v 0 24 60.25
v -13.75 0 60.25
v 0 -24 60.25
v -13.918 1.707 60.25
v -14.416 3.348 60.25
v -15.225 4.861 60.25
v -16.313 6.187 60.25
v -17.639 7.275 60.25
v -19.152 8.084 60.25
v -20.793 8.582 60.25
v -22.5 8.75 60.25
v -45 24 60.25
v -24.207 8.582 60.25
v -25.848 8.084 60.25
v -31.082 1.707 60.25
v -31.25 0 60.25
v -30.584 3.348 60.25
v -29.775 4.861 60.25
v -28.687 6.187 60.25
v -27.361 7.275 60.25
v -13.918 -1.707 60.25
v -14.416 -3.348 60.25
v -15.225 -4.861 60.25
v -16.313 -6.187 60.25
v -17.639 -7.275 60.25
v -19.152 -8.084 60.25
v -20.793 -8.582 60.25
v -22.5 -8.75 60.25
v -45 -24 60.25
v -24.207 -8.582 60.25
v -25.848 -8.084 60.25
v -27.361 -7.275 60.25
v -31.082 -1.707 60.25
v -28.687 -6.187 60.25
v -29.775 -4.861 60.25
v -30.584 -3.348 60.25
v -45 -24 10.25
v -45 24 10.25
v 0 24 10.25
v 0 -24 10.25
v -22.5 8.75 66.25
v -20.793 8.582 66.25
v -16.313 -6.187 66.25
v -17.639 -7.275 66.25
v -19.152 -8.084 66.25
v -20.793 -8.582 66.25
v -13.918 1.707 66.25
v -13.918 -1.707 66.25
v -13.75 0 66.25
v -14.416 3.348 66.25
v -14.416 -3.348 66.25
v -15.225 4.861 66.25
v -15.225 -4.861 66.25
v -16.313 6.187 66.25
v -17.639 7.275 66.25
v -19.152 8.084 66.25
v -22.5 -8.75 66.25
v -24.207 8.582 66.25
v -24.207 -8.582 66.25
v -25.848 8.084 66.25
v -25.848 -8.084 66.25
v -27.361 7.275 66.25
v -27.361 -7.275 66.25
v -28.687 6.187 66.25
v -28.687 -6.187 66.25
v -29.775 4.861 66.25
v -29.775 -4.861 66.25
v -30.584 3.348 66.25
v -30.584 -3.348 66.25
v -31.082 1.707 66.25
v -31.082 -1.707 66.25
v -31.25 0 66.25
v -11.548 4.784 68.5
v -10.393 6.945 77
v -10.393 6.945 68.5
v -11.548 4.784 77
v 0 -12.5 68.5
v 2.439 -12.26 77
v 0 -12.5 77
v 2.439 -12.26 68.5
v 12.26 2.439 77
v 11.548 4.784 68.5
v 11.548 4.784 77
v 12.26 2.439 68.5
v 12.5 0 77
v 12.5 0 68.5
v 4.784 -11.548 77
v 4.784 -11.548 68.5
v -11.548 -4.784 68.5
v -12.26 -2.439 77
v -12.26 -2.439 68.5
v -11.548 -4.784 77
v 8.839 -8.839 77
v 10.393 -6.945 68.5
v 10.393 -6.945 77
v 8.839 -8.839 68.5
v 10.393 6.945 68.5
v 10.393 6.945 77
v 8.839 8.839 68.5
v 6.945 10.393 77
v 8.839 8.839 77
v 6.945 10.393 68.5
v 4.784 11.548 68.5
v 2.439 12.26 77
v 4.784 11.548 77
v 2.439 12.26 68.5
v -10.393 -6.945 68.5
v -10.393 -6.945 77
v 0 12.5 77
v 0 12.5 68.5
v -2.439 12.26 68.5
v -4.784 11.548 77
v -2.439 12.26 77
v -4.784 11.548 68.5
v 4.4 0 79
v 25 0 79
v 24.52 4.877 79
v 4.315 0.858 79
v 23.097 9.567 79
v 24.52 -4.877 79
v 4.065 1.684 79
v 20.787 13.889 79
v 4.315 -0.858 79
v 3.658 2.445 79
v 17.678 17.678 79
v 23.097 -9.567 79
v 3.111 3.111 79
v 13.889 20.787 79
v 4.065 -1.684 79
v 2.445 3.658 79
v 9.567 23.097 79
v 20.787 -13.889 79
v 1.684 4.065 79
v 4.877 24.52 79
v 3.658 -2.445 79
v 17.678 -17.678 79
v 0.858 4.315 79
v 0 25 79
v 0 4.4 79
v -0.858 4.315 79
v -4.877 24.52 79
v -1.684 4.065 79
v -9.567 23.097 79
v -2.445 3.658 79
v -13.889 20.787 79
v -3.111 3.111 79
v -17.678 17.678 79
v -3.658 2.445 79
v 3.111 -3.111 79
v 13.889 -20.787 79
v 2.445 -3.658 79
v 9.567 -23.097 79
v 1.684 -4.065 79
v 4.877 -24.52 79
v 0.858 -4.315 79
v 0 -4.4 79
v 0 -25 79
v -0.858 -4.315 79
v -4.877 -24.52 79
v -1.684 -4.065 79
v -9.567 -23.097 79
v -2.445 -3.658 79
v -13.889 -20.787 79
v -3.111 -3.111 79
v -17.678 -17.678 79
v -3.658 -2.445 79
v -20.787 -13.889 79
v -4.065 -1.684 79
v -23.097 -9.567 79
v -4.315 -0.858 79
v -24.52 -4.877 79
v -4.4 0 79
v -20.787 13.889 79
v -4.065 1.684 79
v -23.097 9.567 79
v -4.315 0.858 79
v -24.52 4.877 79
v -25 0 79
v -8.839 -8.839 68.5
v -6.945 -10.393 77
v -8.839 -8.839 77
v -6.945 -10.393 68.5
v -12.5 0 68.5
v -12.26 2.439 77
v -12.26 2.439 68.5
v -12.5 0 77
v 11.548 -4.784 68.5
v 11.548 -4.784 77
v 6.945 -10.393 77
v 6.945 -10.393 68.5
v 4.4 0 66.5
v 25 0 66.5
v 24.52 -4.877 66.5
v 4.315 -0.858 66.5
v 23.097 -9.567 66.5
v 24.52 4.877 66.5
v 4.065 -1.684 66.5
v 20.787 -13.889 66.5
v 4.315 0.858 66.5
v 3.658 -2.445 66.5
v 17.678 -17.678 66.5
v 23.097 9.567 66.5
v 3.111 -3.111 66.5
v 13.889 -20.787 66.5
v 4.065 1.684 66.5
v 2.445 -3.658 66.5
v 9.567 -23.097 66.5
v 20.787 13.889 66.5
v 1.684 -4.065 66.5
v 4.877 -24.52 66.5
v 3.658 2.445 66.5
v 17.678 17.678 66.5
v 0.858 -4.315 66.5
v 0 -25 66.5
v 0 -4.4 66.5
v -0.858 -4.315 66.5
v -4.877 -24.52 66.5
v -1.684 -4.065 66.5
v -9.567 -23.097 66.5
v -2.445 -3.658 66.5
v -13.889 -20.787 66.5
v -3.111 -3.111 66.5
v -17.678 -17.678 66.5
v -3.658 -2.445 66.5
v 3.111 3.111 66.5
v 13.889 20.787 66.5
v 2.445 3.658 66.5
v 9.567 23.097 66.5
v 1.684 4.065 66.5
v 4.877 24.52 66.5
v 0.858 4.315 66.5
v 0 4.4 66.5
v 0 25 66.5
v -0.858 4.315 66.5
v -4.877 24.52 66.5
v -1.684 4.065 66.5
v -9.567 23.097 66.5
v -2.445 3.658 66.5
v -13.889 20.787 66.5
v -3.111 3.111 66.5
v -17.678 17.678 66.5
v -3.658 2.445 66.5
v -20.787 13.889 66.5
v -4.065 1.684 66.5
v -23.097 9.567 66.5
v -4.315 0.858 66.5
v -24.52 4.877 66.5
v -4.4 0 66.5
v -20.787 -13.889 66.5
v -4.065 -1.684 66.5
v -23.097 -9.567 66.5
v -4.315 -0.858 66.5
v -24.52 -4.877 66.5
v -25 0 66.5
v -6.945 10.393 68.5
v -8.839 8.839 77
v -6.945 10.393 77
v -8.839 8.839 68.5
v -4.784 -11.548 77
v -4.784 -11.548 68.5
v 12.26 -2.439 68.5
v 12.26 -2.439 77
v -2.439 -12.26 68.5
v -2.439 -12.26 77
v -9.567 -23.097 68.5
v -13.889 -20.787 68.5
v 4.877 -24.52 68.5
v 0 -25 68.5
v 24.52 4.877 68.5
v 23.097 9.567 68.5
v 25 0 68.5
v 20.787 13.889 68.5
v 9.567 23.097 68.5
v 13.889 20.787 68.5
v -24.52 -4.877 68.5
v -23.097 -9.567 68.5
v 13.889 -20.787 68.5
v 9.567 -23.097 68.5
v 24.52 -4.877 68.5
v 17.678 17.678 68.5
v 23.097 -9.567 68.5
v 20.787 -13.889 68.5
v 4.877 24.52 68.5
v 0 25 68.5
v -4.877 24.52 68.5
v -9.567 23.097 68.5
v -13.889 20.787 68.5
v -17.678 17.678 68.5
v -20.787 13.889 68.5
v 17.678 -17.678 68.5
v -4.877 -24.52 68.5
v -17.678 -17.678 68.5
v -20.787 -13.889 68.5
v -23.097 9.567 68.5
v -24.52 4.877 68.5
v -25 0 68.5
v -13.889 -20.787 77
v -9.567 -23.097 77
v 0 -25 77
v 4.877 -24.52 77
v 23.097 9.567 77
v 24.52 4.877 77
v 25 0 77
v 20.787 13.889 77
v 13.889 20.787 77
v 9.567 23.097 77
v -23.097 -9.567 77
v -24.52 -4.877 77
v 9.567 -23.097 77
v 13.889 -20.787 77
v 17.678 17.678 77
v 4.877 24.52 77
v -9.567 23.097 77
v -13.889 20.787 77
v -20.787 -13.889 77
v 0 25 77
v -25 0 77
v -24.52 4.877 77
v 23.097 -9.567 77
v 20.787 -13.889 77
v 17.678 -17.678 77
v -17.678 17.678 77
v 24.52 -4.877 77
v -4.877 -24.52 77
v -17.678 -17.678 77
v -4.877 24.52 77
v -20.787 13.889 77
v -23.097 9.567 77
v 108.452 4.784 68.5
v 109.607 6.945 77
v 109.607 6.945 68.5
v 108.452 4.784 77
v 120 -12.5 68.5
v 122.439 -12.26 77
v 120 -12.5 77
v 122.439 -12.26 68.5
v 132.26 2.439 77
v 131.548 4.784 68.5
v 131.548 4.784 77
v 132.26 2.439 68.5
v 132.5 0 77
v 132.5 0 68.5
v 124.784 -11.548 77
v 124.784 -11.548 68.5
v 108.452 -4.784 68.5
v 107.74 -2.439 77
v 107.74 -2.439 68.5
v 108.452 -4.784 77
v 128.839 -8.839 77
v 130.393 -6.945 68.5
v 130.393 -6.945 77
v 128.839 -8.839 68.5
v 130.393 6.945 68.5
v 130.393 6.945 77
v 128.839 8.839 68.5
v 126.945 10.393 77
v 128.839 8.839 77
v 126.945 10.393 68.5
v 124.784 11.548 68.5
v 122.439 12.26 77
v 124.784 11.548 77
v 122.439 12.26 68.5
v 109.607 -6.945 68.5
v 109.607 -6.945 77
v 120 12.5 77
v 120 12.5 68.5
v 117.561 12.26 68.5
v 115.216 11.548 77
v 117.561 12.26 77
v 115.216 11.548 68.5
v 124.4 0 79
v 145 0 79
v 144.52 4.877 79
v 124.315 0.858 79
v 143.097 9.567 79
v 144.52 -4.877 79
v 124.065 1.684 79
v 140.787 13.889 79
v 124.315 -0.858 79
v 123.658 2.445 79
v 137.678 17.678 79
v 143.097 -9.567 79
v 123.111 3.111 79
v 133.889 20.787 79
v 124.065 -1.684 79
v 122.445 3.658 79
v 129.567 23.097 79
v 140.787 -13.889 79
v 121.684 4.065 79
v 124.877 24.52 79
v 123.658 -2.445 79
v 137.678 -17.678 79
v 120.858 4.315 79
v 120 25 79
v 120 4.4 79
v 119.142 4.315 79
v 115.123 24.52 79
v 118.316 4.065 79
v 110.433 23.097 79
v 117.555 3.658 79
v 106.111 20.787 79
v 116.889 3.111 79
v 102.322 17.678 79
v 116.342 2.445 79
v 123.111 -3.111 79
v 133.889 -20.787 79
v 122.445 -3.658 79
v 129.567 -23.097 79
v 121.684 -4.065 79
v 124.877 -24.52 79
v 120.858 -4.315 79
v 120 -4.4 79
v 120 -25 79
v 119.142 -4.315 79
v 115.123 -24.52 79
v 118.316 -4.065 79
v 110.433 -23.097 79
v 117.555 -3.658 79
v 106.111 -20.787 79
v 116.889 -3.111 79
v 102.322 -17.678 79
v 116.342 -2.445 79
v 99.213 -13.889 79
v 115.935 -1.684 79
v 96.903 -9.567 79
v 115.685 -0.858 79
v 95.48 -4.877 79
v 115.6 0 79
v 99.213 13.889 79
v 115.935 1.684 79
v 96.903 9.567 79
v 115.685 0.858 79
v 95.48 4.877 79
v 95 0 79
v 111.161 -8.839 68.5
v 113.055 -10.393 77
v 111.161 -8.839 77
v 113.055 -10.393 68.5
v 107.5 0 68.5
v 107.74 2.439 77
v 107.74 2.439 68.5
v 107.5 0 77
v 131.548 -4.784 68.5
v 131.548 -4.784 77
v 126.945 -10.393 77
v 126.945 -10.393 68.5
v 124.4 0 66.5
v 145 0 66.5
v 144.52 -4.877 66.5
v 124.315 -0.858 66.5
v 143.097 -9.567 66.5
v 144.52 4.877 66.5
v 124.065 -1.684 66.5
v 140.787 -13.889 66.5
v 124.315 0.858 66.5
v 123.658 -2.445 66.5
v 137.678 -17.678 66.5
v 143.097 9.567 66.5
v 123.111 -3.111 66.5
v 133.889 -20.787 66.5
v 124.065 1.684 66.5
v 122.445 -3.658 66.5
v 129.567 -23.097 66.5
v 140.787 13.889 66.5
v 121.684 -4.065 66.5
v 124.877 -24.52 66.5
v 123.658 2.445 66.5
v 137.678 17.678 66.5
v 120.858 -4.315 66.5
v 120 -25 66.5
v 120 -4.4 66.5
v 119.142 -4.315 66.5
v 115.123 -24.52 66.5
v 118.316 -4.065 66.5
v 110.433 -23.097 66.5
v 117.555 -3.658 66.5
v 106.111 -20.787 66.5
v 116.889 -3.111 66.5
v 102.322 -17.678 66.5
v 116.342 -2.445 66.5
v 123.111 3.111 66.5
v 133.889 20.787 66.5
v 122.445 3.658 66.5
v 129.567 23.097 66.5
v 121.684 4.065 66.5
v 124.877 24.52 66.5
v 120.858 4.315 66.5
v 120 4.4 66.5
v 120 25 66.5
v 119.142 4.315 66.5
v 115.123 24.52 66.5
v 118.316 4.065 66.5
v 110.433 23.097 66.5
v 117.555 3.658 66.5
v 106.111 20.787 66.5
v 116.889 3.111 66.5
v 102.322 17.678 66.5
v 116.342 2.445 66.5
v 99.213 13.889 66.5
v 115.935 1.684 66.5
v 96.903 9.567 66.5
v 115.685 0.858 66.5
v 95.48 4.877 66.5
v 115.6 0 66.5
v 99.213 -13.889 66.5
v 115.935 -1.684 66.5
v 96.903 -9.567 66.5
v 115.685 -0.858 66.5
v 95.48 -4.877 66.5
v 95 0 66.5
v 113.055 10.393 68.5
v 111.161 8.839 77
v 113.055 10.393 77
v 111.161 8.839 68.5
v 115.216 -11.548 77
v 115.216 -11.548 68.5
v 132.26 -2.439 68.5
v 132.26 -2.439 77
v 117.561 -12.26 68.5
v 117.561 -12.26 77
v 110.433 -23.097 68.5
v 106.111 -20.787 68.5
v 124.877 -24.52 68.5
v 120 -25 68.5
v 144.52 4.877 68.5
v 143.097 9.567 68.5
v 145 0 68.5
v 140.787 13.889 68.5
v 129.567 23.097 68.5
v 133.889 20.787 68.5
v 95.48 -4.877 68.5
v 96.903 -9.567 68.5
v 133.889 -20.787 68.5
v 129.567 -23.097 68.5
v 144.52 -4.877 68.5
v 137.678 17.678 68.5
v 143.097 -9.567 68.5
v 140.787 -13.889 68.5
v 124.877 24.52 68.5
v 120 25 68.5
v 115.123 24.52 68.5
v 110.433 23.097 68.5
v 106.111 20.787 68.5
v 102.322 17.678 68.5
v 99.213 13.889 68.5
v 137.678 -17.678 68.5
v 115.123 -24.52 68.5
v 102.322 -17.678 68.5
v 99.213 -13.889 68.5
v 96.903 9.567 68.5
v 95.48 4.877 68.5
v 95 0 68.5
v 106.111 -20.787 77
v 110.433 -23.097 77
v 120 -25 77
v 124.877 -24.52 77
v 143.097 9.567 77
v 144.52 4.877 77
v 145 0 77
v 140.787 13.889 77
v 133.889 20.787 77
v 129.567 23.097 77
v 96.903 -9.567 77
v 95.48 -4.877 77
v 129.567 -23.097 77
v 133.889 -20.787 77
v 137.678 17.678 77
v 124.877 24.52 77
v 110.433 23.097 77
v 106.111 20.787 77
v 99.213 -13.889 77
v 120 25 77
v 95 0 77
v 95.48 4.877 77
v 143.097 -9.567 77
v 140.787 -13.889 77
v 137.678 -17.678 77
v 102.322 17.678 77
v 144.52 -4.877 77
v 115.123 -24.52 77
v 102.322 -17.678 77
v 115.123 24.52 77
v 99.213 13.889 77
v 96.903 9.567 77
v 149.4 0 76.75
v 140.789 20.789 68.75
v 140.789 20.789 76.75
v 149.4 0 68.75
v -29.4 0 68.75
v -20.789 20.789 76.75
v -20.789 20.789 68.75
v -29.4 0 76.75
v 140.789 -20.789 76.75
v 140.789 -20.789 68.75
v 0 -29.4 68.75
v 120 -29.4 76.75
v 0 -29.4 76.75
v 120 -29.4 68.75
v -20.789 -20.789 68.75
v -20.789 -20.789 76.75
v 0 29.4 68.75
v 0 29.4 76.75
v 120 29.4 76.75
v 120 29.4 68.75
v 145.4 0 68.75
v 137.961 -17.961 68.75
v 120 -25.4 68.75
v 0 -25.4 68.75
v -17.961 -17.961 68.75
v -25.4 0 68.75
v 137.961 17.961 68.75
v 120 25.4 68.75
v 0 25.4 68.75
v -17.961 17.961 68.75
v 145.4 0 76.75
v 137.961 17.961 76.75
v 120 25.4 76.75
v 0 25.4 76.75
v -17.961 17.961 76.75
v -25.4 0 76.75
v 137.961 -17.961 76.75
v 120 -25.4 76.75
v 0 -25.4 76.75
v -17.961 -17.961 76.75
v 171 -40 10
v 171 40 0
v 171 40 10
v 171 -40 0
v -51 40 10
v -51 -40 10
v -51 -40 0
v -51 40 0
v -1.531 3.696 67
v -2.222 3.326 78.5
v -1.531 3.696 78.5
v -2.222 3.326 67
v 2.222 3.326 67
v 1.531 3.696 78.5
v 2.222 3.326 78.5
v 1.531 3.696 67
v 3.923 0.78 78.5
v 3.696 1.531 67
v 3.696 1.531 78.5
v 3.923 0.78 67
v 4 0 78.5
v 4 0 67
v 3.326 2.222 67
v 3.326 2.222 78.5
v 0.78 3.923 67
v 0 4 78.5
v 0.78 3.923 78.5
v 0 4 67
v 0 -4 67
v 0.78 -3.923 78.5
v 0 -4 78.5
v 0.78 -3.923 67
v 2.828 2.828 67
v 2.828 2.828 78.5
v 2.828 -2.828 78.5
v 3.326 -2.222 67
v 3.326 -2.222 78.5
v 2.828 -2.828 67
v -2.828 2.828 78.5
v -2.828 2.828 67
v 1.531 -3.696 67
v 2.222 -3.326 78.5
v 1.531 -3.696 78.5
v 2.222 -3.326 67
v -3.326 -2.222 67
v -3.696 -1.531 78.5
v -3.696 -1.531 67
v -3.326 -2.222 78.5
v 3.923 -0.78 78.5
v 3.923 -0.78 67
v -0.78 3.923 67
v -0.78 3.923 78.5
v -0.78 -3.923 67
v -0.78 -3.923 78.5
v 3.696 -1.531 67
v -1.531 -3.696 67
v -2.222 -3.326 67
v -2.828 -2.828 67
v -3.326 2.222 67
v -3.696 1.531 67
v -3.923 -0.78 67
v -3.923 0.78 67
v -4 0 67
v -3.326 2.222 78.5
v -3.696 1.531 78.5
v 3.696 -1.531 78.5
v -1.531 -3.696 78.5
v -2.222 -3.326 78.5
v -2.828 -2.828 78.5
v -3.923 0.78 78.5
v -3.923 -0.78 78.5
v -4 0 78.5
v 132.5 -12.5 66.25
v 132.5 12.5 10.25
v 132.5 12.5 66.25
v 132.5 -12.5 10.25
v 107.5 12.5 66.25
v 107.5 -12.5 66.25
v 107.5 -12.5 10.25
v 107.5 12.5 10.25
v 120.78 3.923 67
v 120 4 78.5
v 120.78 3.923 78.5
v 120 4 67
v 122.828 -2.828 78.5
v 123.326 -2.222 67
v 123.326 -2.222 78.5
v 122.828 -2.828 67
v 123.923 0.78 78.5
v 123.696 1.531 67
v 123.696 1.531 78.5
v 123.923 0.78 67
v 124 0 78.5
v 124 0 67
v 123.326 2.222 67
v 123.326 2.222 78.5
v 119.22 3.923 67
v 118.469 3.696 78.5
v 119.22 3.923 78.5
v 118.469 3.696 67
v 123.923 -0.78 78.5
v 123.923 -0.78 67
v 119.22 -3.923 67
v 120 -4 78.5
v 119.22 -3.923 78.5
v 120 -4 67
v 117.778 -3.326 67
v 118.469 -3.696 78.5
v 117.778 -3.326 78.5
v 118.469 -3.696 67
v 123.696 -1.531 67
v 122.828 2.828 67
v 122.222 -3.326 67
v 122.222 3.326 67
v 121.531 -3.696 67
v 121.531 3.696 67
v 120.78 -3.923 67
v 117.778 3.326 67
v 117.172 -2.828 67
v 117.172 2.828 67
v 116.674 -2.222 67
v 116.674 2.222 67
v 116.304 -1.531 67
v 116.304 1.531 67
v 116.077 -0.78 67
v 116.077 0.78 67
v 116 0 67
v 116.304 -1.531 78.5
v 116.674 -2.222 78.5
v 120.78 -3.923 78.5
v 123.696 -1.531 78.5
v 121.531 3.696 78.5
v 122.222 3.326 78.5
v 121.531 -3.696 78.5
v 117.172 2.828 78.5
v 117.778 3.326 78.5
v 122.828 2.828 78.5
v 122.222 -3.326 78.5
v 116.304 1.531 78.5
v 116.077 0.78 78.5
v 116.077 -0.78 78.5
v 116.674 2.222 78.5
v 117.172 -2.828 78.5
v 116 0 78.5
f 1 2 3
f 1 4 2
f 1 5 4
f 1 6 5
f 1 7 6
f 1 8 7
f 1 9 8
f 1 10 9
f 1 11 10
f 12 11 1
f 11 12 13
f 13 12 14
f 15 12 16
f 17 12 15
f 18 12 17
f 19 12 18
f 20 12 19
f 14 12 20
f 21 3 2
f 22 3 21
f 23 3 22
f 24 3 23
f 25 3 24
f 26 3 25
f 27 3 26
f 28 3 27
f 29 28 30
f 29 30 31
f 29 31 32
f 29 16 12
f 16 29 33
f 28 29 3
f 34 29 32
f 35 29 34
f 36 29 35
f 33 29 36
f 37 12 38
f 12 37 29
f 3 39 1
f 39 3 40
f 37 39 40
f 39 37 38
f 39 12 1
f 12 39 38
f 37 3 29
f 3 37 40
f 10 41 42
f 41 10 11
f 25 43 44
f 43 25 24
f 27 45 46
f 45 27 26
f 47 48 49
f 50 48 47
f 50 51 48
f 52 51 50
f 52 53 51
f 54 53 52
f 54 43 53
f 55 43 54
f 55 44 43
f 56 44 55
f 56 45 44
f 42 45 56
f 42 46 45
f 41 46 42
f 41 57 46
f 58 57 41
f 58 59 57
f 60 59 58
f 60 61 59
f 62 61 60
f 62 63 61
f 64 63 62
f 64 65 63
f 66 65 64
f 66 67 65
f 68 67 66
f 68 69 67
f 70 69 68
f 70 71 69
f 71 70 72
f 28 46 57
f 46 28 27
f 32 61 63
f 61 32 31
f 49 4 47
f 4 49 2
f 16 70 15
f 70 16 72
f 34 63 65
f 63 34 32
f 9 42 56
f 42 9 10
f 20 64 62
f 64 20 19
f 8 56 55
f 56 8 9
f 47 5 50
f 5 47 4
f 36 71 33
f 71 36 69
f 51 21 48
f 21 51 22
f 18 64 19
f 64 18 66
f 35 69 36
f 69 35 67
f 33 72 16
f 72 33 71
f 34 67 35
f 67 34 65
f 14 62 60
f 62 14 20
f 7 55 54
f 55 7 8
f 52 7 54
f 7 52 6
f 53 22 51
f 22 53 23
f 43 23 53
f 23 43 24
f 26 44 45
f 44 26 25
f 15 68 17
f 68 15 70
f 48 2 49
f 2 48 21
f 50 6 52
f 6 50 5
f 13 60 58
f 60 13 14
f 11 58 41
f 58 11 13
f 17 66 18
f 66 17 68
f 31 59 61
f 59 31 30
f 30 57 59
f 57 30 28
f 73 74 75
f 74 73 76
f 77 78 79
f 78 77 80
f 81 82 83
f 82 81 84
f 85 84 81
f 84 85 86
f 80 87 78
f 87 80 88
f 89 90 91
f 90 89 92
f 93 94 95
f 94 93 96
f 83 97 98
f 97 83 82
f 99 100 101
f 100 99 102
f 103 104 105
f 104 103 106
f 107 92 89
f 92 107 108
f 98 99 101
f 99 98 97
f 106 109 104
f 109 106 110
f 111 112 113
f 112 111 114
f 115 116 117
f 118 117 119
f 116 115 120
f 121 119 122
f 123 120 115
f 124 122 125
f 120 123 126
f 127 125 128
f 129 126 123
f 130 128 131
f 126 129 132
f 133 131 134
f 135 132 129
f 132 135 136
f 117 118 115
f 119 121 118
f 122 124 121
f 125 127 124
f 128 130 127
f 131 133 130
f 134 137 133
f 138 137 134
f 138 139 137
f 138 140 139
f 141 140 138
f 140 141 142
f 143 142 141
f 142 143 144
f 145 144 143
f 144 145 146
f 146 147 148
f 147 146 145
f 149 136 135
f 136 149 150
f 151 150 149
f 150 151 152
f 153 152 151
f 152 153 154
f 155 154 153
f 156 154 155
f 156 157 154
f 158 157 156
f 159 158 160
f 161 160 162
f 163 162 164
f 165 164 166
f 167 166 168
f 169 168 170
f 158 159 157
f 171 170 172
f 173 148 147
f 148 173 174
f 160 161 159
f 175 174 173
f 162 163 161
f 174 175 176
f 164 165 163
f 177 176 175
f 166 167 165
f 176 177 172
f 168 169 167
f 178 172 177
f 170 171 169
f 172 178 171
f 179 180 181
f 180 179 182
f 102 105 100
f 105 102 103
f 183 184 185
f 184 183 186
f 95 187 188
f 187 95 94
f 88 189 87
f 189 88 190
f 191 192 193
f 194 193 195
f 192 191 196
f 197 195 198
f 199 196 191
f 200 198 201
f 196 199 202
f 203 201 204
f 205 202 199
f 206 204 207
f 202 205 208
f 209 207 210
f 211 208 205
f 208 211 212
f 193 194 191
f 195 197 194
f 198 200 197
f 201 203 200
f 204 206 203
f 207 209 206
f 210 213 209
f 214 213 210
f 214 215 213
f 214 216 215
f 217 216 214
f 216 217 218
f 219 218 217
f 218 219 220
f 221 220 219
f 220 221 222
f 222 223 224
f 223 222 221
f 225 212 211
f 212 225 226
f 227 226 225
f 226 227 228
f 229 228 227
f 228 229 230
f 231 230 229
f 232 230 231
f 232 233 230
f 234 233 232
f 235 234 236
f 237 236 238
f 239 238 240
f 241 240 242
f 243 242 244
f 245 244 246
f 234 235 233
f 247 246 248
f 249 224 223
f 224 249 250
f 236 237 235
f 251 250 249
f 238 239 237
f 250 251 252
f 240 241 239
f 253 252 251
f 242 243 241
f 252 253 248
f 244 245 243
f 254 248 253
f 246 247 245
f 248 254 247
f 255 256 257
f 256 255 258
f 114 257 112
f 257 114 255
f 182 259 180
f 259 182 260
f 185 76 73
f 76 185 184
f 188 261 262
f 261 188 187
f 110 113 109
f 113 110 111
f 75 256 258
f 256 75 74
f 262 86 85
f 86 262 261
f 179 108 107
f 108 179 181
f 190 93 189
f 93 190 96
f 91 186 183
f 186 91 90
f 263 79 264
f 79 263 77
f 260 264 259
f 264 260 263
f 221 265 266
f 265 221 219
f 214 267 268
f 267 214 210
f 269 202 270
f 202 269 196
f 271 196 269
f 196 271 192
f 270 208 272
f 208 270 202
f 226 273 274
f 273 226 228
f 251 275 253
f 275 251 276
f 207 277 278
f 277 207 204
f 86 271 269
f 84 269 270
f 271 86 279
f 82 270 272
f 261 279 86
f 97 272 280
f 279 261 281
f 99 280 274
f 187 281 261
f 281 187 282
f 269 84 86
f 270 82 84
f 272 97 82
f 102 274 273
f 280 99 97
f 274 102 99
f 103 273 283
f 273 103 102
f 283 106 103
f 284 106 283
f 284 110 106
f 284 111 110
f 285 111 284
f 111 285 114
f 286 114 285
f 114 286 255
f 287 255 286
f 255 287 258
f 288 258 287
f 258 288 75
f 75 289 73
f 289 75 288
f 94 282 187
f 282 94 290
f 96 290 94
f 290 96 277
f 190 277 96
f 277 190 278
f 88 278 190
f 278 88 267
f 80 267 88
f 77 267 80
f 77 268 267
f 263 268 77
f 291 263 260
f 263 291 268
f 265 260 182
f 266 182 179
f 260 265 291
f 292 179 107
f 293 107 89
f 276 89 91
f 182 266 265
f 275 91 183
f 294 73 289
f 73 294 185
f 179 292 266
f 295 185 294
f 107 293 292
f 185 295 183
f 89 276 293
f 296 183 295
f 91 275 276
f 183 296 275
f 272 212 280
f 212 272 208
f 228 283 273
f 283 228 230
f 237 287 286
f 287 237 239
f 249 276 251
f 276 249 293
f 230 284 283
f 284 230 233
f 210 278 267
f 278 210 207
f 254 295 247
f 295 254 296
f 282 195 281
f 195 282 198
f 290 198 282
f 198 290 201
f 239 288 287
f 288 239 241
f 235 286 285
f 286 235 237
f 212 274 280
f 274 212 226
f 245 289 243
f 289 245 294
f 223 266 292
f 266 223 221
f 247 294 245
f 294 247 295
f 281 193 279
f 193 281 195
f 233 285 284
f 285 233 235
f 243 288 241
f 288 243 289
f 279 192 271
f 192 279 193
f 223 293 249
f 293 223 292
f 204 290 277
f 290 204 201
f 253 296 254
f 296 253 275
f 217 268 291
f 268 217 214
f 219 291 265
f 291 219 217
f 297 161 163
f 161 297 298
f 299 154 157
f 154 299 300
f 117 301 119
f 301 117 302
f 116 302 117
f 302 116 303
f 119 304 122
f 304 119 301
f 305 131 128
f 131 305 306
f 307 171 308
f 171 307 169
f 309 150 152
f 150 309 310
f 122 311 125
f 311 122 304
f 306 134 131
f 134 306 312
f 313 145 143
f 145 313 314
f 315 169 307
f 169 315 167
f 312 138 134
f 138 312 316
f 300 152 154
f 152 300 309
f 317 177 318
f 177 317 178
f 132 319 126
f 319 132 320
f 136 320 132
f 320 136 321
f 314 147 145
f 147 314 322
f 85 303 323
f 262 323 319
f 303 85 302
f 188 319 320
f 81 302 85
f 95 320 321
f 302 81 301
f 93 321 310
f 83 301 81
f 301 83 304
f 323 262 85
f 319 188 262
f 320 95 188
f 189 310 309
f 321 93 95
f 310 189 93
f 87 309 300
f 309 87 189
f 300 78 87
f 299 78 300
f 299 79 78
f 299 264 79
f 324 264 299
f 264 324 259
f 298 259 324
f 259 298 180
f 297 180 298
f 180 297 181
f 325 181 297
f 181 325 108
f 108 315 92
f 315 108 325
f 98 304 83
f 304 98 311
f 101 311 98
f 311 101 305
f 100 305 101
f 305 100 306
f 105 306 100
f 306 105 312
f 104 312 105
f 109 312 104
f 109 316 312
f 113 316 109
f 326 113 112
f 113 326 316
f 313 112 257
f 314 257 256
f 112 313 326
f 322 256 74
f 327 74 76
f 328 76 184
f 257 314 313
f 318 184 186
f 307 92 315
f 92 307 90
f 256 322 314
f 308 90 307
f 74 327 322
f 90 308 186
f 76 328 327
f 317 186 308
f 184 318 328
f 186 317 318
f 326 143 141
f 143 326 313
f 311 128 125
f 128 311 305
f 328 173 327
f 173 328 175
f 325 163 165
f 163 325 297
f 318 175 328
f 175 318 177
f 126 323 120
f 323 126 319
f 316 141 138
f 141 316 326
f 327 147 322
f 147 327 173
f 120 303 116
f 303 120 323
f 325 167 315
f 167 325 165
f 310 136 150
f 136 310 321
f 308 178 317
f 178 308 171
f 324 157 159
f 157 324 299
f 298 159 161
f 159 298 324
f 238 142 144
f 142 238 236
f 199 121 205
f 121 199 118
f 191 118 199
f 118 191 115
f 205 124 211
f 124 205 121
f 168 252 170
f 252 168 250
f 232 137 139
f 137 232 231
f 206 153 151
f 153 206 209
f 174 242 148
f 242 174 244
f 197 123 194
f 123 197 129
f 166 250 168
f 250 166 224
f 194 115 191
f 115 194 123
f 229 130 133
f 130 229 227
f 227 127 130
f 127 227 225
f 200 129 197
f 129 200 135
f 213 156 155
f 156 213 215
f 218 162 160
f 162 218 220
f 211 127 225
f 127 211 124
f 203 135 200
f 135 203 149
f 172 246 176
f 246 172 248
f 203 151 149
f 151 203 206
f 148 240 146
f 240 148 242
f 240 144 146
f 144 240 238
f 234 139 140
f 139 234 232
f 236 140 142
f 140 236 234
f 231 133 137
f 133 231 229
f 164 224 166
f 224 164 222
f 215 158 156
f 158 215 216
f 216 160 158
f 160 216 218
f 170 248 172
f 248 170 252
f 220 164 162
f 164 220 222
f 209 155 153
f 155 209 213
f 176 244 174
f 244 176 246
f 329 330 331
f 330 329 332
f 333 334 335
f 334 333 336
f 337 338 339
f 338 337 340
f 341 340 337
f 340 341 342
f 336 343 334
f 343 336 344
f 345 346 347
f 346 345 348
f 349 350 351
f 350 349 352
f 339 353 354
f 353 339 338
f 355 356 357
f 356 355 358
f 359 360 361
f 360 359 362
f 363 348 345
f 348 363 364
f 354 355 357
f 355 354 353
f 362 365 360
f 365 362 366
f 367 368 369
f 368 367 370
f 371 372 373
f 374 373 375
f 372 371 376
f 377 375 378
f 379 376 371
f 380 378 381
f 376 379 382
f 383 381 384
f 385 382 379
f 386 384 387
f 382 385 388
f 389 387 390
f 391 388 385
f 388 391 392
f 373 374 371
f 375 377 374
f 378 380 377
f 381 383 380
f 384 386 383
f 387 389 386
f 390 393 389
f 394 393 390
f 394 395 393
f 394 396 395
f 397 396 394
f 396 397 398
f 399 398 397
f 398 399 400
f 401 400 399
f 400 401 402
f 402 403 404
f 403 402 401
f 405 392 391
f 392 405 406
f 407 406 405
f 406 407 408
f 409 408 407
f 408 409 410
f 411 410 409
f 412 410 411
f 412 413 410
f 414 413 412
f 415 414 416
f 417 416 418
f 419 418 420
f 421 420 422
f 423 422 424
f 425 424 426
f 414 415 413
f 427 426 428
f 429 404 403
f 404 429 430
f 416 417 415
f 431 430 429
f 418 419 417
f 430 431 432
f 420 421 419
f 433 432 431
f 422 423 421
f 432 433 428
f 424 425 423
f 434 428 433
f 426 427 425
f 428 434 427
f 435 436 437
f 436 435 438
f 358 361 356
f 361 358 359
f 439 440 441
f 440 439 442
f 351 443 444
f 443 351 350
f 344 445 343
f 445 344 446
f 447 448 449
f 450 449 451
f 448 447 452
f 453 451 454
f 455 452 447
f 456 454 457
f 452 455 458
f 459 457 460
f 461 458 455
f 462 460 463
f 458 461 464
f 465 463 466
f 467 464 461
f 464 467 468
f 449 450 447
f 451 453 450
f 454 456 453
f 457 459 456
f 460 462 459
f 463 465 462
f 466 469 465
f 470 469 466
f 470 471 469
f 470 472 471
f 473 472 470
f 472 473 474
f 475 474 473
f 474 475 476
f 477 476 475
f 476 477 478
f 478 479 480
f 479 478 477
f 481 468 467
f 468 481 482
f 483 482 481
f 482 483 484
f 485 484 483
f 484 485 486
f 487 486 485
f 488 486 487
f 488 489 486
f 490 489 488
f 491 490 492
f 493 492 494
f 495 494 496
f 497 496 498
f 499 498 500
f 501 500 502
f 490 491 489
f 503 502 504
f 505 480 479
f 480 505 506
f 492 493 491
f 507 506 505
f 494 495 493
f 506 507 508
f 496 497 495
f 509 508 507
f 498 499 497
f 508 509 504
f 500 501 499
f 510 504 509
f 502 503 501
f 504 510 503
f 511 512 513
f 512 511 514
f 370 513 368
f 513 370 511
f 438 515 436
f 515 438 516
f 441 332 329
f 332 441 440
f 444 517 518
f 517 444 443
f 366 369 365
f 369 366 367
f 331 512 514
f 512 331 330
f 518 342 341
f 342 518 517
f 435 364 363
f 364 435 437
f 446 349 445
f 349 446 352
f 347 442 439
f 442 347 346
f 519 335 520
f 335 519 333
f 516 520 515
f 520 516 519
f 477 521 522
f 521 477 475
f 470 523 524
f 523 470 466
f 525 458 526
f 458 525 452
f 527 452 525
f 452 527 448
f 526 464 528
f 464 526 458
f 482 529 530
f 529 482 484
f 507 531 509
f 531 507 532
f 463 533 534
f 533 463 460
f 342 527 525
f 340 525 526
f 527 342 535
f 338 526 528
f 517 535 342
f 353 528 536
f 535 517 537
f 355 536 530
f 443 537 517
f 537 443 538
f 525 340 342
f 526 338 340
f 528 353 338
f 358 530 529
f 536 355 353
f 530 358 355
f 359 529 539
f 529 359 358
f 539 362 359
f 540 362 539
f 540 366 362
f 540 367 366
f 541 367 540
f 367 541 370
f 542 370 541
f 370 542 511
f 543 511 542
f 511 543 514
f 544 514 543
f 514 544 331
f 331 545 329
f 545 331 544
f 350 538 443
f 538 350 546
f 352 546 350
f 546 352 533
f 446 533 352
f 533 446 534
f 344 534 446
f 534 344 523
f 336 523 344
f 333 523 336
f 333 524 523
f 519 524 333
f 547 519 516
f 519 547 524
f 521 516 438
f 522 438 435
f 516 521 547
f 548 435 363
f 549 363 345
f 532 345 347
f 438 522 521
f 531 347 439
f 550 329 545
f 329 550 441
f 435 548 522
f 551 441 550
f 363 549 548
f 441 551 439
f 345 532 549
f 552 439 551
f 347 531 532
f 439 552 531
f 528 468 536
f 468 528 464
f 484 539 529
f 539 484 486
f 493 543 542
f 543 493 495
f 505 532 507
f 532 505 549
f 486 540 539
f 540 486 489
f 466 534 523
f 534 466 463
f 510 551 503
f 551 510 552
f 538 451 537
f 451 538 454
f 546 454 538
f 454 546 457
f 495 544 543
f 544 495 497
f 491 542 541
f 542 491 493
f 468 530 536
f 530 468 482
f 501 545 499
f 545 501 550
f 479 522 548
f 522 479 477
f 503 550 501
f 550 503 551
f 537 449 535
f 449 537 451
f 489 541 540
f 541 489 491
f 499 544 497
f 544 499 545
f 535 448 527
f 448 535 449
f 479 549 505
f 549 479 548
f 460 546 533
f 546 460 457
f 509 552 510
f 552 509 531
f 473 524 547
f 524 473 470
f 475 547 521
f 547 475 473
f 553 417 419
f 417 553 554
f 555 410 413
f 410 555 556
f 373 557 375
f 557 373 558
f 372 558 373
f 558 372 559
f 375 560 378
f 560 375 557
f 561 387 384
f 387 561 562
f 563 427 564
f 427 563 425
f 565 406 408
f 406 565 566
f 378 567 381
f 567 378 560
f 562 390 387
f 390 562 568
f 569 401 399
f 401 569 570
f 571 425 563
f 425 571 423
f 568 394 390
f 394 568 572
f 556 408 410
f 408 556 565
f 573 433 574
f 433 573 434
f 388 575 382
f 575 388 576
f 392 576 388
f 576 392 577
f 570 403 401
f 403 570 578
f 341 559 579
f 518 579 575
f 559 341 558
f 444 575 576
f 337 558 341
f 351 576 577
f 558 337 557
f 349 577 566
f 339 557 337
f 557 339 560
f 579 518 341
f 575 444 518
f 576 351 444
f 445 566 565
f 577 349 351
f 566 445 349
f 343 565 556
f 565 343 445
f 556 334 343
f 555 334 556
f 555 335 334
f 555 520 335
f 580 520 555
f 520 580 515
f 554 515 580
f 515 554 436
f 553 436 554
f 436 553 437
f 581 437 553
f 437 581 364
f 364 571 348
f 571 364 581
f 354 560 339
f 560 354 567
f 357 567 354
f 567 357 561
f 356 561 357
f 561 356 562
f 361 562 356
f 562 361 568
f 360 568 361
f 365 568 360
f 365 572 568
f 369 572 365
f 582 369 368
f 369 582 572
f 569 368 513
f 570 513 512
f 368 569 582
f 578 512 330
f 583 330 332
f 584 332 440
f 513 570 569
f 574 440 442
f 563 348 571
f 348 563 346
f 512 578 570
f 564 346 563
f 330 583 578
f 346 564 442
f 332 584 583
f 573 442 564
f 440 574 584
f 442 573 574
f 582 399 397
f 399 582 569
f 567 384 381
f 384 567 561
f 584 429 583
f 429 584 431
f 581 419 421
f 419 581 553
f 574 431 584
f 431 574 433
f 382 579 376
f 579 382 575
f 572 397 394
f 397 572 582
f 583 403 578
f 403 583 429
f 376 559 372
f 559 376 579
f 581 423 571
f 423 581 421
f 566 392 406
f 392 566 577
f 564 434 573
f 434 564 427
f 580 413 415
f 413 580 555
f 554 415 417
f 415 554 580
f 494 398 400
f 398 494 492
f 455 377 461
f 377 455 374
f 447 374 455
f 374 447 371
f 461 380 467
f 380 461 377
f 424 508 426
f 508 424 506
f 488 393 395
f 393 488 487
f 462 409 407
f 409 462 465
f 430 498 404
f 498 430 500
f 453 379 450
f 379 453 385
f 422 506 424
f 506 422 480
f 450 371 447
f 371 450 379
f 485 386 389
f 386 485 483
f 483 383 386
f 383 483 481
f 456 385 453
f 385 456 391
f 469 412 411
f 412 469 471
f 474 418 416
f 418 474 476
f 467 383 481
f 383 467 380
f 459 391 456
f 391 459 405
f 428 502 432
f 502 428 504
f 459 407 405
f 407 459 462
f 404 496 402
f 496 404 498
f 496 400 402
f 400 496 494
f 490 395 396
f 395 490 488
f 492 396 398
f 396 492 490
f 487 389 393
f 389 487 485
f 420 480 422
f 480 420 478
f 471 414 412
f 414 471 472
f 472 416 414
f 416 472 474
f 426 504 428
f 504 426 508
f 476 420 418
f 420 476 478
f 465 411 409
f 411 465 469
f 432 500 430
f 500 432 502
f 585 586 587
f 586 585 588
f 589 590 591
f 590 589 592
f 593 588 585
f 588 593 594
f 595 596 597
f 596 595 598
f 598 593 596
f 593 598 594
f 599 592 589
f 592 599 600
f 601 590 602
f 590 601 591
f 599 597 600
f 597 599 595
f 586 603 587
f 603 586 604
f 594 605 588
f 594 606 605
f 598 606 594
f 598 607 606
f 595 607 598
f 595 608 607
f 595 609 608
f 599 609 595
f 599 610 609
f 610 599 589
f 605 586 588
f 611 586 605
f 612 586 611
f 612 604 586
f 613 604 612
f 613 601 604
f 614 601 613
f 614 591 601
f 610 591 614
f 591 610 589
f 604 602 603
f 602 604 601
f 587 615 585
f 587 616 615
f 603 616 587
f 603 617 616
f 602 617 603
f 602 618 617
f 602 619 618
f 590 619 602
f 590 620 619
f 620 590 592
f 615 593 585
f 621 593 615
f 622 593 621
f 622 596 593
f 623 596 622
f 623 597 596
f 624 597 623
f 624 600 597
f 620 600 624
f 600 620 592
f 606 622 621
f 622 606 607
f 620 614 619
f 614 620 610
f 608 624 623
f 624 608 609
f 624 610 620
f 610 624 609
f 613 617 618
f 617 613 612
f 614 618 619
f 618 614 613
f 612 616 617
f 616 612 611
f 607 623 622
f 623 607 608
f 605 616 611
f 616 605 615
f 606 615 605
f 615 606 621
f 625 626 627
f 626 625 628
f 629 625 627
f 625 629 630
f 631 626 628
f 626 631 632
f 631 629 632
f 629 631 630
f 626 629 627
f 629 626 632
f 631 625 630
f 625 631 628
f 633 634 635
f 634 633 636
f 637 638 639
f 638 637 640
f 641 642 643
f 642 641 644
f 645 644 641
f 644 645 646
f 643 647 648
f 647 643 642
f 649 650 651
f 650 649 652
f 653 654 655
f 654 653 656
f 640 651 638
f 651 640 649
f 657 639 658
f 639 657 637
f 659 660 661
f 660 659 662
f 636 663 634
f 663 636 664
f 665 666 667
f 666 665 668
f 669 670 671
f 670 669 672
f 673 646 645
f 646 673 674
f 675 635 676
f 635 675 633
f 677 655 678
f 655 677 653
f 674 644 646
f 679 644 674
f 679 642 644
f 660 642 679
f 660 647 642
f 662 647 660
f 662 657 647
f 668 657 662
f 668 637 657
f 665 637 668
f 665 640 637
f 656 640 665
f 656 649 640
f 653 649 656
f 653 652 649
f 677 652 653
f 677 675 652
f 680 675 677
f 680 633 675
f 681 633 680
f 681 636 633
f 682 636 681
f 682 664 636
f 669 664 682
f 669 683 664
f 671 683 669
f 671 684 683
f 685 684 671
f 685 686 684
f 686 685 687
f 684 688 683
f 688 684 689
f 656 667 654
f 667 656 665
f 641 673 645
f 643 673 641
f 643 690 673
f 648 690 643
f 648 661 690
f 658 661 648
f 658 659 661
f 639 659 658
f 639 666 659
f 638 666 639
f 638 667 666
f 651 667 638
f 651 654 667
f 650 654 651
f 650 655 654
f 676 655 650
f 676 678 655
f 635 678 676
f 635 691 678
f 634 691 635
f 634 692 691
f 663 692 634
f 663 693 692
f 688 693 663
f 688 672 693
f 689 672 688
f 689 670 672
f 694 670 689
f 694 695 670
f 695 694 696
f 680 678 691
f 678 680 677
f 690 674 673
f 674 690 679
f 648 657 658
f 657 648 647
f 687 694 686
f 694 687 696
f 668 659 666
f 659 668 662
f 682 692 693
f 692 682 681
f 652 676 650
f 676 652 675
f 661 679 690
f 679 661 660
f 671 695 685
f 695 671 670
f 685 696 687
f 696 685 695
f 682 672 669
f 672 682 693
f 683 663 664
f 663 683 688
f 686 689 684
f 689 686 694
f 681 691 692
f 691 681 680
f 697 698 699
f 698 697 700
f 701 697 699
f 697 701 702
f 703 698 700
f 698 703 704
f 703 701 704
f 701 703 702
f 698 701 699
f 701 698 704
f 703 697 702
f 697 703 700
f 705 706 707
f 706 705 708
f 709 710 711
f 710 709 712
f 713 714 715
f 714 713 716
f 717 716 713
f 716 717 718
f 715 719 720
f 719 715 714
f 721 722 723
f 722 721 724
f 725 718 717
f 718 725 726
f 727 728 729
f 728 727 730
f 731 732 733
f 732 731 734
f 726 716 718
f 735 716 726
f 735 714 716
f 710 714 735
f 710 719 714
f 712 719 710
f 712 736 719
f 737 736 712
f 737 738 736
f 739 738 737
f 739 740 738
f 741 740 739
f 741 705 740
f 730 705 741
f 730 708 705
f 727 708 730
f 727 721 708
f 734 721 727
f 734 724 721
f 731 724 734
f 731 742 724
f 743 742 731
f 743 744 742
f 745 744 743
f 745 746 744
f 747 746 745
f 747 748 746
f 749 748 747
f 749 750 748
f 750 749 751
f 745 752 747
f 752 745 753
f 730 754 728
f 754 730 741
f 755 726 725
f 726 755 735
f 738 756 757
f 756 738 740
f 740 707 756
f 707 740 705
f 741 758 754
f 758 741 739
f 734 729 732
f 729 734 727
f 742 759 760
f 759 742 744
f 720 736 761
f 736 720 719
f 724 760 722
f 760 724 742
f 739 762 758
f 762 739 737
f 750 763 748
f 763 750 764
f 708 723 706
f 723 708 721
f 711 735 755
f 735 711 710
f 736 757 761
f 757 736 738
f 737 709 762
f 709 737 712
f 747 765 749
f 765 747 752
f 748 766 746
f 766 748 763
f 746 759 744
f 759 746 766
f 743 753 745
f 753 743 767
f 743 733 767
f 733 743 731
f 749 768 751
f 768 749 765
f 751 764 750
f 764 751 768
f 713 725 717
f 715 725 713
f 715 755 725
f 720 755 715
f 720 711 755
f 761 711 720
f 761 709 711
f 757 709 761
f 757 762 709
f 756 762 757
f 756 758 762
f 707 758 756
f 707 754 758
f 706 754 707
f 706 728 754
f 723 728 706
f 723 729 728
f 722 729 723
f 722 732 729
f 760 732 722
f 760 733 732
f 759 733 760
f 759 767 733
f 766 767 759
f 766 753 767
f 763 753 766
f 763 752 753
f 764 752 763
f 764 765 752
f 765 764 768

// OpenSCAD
$fn = 32;

// ------------------------------------------------------------------------
// Motor belt drive: span 120 mm, pulleys d50, belt 8 mm wide
// Every part is its own module, assembly() places every instance.
// ------------------------------------------------------------------------

// --- part 1 ---
module base_plate() {
  difference() {
    translate([-111, -40, 0]) cube([222, 80, 10]);
  }
}

// --- part 2 ---
module motor() {
  union() {
    translate([-25, -24, 0]) cube([50, 48, 45]);
    translate([28, 0, 22.5]) rotate([0, 90, 0]) cylinder(h = 6, d = 17.5, center = true);
  }
}

// --- part 3 ---
module drive_shaft() {
  translate([0, 0, -5.75]) cylinder(h = 11.5, d = 8);
}

// --- part 4 ---
module pulley_drive() {
  difference() {
    union() {
      cylinder(h = 12.5, d = 25);
      cylinder(h = 2, d = 50);
      translate([0, 0, 10.5]) cylinder(h = 2, d = 50);
    }
    translate([0, 0, -1]) cylinder(h = 14.5, d = 8.8);
  }
}

// --- part 5 ---
module idler_post() {
  translate([-12.5, -12.5, 0]) cube([25, 25, 56]);
}

// --- part 6 ---
module driven_shaft() {
  translate([0, 0, -5.75]) cylinder(h = 11.5, d = 8);
}

// --- part 7 ---
module pulley_driven() {
  difference() {
    union() {
      cylinder(h = 12.5, d = 25);
      cylinder(h = 2, d = 50);
      translate([0, 0, 10.5]) cylinder(h = 2, d = 50);
    }
    translate([0, 0, -1]) cylinder(h = 14.5, d = 8.8);
  }
}

// --- part 8 ---
module drive_belt() {
  difference() {
    linear_extrude(height = 8) polygon(points = concat([for (a = [90 : 45 : 270]) [29.4 * cos(a), 29.4 * sin(a)]], [for (a = [270 : 45 : 450]) [120 + 29.4 * cos(a), 29.4 * sin(a)]]));
    translate([0, 0, -1]) linear_extrude(height = 10) polygon(points = concat([for (a = [90 : 45 : 270]) [25.4 * cos(a), 25.4 * sin(a)]], [for (a = [270 : 45 : 450]) [120 + 25.4 * cos(a), 25.4 * sin(a)]]));
  }
}

// --- assembly ---
module assembly() {
  color([0.80, 0.24, 0.20]) translate([60, 0, 0]) rotate([0, 0, 0]) base_plate();
  color([0.20, 0.45, 0.75]) translate([0, 0, 35.25]) rotate([0, 270, 0]) motor();
  color([0.25, 0.62, 0.32]) translate([0, 0, 72.75]) rotate([0, 0, 0]) drive_shaft();
  color([0.92, 0.70, 0.18]) translate([0, 0, 66.5]) rotate([0, 0, 0]) pulley_drive();
  color([0.58, 0.35, 0.70]) translate([120, 0, 10.25]) rotate([0, 0, 0]) idler_post();
  color([0.16, 0.66, 0.66]) translate([120, 0, 72.75]) rotate([0, 0, 0]) driven_shaft();
  color([0.85, 0.48, 0.18]) translate([120, 0, 66.5]) rotate([0, 0, 0]) pulley_driven();
  color([0.55, 0.60, 0.65]) translate([0, 0, 68.75]) rotate([0, 0, 0]) drive_belt();
}

assembly();
